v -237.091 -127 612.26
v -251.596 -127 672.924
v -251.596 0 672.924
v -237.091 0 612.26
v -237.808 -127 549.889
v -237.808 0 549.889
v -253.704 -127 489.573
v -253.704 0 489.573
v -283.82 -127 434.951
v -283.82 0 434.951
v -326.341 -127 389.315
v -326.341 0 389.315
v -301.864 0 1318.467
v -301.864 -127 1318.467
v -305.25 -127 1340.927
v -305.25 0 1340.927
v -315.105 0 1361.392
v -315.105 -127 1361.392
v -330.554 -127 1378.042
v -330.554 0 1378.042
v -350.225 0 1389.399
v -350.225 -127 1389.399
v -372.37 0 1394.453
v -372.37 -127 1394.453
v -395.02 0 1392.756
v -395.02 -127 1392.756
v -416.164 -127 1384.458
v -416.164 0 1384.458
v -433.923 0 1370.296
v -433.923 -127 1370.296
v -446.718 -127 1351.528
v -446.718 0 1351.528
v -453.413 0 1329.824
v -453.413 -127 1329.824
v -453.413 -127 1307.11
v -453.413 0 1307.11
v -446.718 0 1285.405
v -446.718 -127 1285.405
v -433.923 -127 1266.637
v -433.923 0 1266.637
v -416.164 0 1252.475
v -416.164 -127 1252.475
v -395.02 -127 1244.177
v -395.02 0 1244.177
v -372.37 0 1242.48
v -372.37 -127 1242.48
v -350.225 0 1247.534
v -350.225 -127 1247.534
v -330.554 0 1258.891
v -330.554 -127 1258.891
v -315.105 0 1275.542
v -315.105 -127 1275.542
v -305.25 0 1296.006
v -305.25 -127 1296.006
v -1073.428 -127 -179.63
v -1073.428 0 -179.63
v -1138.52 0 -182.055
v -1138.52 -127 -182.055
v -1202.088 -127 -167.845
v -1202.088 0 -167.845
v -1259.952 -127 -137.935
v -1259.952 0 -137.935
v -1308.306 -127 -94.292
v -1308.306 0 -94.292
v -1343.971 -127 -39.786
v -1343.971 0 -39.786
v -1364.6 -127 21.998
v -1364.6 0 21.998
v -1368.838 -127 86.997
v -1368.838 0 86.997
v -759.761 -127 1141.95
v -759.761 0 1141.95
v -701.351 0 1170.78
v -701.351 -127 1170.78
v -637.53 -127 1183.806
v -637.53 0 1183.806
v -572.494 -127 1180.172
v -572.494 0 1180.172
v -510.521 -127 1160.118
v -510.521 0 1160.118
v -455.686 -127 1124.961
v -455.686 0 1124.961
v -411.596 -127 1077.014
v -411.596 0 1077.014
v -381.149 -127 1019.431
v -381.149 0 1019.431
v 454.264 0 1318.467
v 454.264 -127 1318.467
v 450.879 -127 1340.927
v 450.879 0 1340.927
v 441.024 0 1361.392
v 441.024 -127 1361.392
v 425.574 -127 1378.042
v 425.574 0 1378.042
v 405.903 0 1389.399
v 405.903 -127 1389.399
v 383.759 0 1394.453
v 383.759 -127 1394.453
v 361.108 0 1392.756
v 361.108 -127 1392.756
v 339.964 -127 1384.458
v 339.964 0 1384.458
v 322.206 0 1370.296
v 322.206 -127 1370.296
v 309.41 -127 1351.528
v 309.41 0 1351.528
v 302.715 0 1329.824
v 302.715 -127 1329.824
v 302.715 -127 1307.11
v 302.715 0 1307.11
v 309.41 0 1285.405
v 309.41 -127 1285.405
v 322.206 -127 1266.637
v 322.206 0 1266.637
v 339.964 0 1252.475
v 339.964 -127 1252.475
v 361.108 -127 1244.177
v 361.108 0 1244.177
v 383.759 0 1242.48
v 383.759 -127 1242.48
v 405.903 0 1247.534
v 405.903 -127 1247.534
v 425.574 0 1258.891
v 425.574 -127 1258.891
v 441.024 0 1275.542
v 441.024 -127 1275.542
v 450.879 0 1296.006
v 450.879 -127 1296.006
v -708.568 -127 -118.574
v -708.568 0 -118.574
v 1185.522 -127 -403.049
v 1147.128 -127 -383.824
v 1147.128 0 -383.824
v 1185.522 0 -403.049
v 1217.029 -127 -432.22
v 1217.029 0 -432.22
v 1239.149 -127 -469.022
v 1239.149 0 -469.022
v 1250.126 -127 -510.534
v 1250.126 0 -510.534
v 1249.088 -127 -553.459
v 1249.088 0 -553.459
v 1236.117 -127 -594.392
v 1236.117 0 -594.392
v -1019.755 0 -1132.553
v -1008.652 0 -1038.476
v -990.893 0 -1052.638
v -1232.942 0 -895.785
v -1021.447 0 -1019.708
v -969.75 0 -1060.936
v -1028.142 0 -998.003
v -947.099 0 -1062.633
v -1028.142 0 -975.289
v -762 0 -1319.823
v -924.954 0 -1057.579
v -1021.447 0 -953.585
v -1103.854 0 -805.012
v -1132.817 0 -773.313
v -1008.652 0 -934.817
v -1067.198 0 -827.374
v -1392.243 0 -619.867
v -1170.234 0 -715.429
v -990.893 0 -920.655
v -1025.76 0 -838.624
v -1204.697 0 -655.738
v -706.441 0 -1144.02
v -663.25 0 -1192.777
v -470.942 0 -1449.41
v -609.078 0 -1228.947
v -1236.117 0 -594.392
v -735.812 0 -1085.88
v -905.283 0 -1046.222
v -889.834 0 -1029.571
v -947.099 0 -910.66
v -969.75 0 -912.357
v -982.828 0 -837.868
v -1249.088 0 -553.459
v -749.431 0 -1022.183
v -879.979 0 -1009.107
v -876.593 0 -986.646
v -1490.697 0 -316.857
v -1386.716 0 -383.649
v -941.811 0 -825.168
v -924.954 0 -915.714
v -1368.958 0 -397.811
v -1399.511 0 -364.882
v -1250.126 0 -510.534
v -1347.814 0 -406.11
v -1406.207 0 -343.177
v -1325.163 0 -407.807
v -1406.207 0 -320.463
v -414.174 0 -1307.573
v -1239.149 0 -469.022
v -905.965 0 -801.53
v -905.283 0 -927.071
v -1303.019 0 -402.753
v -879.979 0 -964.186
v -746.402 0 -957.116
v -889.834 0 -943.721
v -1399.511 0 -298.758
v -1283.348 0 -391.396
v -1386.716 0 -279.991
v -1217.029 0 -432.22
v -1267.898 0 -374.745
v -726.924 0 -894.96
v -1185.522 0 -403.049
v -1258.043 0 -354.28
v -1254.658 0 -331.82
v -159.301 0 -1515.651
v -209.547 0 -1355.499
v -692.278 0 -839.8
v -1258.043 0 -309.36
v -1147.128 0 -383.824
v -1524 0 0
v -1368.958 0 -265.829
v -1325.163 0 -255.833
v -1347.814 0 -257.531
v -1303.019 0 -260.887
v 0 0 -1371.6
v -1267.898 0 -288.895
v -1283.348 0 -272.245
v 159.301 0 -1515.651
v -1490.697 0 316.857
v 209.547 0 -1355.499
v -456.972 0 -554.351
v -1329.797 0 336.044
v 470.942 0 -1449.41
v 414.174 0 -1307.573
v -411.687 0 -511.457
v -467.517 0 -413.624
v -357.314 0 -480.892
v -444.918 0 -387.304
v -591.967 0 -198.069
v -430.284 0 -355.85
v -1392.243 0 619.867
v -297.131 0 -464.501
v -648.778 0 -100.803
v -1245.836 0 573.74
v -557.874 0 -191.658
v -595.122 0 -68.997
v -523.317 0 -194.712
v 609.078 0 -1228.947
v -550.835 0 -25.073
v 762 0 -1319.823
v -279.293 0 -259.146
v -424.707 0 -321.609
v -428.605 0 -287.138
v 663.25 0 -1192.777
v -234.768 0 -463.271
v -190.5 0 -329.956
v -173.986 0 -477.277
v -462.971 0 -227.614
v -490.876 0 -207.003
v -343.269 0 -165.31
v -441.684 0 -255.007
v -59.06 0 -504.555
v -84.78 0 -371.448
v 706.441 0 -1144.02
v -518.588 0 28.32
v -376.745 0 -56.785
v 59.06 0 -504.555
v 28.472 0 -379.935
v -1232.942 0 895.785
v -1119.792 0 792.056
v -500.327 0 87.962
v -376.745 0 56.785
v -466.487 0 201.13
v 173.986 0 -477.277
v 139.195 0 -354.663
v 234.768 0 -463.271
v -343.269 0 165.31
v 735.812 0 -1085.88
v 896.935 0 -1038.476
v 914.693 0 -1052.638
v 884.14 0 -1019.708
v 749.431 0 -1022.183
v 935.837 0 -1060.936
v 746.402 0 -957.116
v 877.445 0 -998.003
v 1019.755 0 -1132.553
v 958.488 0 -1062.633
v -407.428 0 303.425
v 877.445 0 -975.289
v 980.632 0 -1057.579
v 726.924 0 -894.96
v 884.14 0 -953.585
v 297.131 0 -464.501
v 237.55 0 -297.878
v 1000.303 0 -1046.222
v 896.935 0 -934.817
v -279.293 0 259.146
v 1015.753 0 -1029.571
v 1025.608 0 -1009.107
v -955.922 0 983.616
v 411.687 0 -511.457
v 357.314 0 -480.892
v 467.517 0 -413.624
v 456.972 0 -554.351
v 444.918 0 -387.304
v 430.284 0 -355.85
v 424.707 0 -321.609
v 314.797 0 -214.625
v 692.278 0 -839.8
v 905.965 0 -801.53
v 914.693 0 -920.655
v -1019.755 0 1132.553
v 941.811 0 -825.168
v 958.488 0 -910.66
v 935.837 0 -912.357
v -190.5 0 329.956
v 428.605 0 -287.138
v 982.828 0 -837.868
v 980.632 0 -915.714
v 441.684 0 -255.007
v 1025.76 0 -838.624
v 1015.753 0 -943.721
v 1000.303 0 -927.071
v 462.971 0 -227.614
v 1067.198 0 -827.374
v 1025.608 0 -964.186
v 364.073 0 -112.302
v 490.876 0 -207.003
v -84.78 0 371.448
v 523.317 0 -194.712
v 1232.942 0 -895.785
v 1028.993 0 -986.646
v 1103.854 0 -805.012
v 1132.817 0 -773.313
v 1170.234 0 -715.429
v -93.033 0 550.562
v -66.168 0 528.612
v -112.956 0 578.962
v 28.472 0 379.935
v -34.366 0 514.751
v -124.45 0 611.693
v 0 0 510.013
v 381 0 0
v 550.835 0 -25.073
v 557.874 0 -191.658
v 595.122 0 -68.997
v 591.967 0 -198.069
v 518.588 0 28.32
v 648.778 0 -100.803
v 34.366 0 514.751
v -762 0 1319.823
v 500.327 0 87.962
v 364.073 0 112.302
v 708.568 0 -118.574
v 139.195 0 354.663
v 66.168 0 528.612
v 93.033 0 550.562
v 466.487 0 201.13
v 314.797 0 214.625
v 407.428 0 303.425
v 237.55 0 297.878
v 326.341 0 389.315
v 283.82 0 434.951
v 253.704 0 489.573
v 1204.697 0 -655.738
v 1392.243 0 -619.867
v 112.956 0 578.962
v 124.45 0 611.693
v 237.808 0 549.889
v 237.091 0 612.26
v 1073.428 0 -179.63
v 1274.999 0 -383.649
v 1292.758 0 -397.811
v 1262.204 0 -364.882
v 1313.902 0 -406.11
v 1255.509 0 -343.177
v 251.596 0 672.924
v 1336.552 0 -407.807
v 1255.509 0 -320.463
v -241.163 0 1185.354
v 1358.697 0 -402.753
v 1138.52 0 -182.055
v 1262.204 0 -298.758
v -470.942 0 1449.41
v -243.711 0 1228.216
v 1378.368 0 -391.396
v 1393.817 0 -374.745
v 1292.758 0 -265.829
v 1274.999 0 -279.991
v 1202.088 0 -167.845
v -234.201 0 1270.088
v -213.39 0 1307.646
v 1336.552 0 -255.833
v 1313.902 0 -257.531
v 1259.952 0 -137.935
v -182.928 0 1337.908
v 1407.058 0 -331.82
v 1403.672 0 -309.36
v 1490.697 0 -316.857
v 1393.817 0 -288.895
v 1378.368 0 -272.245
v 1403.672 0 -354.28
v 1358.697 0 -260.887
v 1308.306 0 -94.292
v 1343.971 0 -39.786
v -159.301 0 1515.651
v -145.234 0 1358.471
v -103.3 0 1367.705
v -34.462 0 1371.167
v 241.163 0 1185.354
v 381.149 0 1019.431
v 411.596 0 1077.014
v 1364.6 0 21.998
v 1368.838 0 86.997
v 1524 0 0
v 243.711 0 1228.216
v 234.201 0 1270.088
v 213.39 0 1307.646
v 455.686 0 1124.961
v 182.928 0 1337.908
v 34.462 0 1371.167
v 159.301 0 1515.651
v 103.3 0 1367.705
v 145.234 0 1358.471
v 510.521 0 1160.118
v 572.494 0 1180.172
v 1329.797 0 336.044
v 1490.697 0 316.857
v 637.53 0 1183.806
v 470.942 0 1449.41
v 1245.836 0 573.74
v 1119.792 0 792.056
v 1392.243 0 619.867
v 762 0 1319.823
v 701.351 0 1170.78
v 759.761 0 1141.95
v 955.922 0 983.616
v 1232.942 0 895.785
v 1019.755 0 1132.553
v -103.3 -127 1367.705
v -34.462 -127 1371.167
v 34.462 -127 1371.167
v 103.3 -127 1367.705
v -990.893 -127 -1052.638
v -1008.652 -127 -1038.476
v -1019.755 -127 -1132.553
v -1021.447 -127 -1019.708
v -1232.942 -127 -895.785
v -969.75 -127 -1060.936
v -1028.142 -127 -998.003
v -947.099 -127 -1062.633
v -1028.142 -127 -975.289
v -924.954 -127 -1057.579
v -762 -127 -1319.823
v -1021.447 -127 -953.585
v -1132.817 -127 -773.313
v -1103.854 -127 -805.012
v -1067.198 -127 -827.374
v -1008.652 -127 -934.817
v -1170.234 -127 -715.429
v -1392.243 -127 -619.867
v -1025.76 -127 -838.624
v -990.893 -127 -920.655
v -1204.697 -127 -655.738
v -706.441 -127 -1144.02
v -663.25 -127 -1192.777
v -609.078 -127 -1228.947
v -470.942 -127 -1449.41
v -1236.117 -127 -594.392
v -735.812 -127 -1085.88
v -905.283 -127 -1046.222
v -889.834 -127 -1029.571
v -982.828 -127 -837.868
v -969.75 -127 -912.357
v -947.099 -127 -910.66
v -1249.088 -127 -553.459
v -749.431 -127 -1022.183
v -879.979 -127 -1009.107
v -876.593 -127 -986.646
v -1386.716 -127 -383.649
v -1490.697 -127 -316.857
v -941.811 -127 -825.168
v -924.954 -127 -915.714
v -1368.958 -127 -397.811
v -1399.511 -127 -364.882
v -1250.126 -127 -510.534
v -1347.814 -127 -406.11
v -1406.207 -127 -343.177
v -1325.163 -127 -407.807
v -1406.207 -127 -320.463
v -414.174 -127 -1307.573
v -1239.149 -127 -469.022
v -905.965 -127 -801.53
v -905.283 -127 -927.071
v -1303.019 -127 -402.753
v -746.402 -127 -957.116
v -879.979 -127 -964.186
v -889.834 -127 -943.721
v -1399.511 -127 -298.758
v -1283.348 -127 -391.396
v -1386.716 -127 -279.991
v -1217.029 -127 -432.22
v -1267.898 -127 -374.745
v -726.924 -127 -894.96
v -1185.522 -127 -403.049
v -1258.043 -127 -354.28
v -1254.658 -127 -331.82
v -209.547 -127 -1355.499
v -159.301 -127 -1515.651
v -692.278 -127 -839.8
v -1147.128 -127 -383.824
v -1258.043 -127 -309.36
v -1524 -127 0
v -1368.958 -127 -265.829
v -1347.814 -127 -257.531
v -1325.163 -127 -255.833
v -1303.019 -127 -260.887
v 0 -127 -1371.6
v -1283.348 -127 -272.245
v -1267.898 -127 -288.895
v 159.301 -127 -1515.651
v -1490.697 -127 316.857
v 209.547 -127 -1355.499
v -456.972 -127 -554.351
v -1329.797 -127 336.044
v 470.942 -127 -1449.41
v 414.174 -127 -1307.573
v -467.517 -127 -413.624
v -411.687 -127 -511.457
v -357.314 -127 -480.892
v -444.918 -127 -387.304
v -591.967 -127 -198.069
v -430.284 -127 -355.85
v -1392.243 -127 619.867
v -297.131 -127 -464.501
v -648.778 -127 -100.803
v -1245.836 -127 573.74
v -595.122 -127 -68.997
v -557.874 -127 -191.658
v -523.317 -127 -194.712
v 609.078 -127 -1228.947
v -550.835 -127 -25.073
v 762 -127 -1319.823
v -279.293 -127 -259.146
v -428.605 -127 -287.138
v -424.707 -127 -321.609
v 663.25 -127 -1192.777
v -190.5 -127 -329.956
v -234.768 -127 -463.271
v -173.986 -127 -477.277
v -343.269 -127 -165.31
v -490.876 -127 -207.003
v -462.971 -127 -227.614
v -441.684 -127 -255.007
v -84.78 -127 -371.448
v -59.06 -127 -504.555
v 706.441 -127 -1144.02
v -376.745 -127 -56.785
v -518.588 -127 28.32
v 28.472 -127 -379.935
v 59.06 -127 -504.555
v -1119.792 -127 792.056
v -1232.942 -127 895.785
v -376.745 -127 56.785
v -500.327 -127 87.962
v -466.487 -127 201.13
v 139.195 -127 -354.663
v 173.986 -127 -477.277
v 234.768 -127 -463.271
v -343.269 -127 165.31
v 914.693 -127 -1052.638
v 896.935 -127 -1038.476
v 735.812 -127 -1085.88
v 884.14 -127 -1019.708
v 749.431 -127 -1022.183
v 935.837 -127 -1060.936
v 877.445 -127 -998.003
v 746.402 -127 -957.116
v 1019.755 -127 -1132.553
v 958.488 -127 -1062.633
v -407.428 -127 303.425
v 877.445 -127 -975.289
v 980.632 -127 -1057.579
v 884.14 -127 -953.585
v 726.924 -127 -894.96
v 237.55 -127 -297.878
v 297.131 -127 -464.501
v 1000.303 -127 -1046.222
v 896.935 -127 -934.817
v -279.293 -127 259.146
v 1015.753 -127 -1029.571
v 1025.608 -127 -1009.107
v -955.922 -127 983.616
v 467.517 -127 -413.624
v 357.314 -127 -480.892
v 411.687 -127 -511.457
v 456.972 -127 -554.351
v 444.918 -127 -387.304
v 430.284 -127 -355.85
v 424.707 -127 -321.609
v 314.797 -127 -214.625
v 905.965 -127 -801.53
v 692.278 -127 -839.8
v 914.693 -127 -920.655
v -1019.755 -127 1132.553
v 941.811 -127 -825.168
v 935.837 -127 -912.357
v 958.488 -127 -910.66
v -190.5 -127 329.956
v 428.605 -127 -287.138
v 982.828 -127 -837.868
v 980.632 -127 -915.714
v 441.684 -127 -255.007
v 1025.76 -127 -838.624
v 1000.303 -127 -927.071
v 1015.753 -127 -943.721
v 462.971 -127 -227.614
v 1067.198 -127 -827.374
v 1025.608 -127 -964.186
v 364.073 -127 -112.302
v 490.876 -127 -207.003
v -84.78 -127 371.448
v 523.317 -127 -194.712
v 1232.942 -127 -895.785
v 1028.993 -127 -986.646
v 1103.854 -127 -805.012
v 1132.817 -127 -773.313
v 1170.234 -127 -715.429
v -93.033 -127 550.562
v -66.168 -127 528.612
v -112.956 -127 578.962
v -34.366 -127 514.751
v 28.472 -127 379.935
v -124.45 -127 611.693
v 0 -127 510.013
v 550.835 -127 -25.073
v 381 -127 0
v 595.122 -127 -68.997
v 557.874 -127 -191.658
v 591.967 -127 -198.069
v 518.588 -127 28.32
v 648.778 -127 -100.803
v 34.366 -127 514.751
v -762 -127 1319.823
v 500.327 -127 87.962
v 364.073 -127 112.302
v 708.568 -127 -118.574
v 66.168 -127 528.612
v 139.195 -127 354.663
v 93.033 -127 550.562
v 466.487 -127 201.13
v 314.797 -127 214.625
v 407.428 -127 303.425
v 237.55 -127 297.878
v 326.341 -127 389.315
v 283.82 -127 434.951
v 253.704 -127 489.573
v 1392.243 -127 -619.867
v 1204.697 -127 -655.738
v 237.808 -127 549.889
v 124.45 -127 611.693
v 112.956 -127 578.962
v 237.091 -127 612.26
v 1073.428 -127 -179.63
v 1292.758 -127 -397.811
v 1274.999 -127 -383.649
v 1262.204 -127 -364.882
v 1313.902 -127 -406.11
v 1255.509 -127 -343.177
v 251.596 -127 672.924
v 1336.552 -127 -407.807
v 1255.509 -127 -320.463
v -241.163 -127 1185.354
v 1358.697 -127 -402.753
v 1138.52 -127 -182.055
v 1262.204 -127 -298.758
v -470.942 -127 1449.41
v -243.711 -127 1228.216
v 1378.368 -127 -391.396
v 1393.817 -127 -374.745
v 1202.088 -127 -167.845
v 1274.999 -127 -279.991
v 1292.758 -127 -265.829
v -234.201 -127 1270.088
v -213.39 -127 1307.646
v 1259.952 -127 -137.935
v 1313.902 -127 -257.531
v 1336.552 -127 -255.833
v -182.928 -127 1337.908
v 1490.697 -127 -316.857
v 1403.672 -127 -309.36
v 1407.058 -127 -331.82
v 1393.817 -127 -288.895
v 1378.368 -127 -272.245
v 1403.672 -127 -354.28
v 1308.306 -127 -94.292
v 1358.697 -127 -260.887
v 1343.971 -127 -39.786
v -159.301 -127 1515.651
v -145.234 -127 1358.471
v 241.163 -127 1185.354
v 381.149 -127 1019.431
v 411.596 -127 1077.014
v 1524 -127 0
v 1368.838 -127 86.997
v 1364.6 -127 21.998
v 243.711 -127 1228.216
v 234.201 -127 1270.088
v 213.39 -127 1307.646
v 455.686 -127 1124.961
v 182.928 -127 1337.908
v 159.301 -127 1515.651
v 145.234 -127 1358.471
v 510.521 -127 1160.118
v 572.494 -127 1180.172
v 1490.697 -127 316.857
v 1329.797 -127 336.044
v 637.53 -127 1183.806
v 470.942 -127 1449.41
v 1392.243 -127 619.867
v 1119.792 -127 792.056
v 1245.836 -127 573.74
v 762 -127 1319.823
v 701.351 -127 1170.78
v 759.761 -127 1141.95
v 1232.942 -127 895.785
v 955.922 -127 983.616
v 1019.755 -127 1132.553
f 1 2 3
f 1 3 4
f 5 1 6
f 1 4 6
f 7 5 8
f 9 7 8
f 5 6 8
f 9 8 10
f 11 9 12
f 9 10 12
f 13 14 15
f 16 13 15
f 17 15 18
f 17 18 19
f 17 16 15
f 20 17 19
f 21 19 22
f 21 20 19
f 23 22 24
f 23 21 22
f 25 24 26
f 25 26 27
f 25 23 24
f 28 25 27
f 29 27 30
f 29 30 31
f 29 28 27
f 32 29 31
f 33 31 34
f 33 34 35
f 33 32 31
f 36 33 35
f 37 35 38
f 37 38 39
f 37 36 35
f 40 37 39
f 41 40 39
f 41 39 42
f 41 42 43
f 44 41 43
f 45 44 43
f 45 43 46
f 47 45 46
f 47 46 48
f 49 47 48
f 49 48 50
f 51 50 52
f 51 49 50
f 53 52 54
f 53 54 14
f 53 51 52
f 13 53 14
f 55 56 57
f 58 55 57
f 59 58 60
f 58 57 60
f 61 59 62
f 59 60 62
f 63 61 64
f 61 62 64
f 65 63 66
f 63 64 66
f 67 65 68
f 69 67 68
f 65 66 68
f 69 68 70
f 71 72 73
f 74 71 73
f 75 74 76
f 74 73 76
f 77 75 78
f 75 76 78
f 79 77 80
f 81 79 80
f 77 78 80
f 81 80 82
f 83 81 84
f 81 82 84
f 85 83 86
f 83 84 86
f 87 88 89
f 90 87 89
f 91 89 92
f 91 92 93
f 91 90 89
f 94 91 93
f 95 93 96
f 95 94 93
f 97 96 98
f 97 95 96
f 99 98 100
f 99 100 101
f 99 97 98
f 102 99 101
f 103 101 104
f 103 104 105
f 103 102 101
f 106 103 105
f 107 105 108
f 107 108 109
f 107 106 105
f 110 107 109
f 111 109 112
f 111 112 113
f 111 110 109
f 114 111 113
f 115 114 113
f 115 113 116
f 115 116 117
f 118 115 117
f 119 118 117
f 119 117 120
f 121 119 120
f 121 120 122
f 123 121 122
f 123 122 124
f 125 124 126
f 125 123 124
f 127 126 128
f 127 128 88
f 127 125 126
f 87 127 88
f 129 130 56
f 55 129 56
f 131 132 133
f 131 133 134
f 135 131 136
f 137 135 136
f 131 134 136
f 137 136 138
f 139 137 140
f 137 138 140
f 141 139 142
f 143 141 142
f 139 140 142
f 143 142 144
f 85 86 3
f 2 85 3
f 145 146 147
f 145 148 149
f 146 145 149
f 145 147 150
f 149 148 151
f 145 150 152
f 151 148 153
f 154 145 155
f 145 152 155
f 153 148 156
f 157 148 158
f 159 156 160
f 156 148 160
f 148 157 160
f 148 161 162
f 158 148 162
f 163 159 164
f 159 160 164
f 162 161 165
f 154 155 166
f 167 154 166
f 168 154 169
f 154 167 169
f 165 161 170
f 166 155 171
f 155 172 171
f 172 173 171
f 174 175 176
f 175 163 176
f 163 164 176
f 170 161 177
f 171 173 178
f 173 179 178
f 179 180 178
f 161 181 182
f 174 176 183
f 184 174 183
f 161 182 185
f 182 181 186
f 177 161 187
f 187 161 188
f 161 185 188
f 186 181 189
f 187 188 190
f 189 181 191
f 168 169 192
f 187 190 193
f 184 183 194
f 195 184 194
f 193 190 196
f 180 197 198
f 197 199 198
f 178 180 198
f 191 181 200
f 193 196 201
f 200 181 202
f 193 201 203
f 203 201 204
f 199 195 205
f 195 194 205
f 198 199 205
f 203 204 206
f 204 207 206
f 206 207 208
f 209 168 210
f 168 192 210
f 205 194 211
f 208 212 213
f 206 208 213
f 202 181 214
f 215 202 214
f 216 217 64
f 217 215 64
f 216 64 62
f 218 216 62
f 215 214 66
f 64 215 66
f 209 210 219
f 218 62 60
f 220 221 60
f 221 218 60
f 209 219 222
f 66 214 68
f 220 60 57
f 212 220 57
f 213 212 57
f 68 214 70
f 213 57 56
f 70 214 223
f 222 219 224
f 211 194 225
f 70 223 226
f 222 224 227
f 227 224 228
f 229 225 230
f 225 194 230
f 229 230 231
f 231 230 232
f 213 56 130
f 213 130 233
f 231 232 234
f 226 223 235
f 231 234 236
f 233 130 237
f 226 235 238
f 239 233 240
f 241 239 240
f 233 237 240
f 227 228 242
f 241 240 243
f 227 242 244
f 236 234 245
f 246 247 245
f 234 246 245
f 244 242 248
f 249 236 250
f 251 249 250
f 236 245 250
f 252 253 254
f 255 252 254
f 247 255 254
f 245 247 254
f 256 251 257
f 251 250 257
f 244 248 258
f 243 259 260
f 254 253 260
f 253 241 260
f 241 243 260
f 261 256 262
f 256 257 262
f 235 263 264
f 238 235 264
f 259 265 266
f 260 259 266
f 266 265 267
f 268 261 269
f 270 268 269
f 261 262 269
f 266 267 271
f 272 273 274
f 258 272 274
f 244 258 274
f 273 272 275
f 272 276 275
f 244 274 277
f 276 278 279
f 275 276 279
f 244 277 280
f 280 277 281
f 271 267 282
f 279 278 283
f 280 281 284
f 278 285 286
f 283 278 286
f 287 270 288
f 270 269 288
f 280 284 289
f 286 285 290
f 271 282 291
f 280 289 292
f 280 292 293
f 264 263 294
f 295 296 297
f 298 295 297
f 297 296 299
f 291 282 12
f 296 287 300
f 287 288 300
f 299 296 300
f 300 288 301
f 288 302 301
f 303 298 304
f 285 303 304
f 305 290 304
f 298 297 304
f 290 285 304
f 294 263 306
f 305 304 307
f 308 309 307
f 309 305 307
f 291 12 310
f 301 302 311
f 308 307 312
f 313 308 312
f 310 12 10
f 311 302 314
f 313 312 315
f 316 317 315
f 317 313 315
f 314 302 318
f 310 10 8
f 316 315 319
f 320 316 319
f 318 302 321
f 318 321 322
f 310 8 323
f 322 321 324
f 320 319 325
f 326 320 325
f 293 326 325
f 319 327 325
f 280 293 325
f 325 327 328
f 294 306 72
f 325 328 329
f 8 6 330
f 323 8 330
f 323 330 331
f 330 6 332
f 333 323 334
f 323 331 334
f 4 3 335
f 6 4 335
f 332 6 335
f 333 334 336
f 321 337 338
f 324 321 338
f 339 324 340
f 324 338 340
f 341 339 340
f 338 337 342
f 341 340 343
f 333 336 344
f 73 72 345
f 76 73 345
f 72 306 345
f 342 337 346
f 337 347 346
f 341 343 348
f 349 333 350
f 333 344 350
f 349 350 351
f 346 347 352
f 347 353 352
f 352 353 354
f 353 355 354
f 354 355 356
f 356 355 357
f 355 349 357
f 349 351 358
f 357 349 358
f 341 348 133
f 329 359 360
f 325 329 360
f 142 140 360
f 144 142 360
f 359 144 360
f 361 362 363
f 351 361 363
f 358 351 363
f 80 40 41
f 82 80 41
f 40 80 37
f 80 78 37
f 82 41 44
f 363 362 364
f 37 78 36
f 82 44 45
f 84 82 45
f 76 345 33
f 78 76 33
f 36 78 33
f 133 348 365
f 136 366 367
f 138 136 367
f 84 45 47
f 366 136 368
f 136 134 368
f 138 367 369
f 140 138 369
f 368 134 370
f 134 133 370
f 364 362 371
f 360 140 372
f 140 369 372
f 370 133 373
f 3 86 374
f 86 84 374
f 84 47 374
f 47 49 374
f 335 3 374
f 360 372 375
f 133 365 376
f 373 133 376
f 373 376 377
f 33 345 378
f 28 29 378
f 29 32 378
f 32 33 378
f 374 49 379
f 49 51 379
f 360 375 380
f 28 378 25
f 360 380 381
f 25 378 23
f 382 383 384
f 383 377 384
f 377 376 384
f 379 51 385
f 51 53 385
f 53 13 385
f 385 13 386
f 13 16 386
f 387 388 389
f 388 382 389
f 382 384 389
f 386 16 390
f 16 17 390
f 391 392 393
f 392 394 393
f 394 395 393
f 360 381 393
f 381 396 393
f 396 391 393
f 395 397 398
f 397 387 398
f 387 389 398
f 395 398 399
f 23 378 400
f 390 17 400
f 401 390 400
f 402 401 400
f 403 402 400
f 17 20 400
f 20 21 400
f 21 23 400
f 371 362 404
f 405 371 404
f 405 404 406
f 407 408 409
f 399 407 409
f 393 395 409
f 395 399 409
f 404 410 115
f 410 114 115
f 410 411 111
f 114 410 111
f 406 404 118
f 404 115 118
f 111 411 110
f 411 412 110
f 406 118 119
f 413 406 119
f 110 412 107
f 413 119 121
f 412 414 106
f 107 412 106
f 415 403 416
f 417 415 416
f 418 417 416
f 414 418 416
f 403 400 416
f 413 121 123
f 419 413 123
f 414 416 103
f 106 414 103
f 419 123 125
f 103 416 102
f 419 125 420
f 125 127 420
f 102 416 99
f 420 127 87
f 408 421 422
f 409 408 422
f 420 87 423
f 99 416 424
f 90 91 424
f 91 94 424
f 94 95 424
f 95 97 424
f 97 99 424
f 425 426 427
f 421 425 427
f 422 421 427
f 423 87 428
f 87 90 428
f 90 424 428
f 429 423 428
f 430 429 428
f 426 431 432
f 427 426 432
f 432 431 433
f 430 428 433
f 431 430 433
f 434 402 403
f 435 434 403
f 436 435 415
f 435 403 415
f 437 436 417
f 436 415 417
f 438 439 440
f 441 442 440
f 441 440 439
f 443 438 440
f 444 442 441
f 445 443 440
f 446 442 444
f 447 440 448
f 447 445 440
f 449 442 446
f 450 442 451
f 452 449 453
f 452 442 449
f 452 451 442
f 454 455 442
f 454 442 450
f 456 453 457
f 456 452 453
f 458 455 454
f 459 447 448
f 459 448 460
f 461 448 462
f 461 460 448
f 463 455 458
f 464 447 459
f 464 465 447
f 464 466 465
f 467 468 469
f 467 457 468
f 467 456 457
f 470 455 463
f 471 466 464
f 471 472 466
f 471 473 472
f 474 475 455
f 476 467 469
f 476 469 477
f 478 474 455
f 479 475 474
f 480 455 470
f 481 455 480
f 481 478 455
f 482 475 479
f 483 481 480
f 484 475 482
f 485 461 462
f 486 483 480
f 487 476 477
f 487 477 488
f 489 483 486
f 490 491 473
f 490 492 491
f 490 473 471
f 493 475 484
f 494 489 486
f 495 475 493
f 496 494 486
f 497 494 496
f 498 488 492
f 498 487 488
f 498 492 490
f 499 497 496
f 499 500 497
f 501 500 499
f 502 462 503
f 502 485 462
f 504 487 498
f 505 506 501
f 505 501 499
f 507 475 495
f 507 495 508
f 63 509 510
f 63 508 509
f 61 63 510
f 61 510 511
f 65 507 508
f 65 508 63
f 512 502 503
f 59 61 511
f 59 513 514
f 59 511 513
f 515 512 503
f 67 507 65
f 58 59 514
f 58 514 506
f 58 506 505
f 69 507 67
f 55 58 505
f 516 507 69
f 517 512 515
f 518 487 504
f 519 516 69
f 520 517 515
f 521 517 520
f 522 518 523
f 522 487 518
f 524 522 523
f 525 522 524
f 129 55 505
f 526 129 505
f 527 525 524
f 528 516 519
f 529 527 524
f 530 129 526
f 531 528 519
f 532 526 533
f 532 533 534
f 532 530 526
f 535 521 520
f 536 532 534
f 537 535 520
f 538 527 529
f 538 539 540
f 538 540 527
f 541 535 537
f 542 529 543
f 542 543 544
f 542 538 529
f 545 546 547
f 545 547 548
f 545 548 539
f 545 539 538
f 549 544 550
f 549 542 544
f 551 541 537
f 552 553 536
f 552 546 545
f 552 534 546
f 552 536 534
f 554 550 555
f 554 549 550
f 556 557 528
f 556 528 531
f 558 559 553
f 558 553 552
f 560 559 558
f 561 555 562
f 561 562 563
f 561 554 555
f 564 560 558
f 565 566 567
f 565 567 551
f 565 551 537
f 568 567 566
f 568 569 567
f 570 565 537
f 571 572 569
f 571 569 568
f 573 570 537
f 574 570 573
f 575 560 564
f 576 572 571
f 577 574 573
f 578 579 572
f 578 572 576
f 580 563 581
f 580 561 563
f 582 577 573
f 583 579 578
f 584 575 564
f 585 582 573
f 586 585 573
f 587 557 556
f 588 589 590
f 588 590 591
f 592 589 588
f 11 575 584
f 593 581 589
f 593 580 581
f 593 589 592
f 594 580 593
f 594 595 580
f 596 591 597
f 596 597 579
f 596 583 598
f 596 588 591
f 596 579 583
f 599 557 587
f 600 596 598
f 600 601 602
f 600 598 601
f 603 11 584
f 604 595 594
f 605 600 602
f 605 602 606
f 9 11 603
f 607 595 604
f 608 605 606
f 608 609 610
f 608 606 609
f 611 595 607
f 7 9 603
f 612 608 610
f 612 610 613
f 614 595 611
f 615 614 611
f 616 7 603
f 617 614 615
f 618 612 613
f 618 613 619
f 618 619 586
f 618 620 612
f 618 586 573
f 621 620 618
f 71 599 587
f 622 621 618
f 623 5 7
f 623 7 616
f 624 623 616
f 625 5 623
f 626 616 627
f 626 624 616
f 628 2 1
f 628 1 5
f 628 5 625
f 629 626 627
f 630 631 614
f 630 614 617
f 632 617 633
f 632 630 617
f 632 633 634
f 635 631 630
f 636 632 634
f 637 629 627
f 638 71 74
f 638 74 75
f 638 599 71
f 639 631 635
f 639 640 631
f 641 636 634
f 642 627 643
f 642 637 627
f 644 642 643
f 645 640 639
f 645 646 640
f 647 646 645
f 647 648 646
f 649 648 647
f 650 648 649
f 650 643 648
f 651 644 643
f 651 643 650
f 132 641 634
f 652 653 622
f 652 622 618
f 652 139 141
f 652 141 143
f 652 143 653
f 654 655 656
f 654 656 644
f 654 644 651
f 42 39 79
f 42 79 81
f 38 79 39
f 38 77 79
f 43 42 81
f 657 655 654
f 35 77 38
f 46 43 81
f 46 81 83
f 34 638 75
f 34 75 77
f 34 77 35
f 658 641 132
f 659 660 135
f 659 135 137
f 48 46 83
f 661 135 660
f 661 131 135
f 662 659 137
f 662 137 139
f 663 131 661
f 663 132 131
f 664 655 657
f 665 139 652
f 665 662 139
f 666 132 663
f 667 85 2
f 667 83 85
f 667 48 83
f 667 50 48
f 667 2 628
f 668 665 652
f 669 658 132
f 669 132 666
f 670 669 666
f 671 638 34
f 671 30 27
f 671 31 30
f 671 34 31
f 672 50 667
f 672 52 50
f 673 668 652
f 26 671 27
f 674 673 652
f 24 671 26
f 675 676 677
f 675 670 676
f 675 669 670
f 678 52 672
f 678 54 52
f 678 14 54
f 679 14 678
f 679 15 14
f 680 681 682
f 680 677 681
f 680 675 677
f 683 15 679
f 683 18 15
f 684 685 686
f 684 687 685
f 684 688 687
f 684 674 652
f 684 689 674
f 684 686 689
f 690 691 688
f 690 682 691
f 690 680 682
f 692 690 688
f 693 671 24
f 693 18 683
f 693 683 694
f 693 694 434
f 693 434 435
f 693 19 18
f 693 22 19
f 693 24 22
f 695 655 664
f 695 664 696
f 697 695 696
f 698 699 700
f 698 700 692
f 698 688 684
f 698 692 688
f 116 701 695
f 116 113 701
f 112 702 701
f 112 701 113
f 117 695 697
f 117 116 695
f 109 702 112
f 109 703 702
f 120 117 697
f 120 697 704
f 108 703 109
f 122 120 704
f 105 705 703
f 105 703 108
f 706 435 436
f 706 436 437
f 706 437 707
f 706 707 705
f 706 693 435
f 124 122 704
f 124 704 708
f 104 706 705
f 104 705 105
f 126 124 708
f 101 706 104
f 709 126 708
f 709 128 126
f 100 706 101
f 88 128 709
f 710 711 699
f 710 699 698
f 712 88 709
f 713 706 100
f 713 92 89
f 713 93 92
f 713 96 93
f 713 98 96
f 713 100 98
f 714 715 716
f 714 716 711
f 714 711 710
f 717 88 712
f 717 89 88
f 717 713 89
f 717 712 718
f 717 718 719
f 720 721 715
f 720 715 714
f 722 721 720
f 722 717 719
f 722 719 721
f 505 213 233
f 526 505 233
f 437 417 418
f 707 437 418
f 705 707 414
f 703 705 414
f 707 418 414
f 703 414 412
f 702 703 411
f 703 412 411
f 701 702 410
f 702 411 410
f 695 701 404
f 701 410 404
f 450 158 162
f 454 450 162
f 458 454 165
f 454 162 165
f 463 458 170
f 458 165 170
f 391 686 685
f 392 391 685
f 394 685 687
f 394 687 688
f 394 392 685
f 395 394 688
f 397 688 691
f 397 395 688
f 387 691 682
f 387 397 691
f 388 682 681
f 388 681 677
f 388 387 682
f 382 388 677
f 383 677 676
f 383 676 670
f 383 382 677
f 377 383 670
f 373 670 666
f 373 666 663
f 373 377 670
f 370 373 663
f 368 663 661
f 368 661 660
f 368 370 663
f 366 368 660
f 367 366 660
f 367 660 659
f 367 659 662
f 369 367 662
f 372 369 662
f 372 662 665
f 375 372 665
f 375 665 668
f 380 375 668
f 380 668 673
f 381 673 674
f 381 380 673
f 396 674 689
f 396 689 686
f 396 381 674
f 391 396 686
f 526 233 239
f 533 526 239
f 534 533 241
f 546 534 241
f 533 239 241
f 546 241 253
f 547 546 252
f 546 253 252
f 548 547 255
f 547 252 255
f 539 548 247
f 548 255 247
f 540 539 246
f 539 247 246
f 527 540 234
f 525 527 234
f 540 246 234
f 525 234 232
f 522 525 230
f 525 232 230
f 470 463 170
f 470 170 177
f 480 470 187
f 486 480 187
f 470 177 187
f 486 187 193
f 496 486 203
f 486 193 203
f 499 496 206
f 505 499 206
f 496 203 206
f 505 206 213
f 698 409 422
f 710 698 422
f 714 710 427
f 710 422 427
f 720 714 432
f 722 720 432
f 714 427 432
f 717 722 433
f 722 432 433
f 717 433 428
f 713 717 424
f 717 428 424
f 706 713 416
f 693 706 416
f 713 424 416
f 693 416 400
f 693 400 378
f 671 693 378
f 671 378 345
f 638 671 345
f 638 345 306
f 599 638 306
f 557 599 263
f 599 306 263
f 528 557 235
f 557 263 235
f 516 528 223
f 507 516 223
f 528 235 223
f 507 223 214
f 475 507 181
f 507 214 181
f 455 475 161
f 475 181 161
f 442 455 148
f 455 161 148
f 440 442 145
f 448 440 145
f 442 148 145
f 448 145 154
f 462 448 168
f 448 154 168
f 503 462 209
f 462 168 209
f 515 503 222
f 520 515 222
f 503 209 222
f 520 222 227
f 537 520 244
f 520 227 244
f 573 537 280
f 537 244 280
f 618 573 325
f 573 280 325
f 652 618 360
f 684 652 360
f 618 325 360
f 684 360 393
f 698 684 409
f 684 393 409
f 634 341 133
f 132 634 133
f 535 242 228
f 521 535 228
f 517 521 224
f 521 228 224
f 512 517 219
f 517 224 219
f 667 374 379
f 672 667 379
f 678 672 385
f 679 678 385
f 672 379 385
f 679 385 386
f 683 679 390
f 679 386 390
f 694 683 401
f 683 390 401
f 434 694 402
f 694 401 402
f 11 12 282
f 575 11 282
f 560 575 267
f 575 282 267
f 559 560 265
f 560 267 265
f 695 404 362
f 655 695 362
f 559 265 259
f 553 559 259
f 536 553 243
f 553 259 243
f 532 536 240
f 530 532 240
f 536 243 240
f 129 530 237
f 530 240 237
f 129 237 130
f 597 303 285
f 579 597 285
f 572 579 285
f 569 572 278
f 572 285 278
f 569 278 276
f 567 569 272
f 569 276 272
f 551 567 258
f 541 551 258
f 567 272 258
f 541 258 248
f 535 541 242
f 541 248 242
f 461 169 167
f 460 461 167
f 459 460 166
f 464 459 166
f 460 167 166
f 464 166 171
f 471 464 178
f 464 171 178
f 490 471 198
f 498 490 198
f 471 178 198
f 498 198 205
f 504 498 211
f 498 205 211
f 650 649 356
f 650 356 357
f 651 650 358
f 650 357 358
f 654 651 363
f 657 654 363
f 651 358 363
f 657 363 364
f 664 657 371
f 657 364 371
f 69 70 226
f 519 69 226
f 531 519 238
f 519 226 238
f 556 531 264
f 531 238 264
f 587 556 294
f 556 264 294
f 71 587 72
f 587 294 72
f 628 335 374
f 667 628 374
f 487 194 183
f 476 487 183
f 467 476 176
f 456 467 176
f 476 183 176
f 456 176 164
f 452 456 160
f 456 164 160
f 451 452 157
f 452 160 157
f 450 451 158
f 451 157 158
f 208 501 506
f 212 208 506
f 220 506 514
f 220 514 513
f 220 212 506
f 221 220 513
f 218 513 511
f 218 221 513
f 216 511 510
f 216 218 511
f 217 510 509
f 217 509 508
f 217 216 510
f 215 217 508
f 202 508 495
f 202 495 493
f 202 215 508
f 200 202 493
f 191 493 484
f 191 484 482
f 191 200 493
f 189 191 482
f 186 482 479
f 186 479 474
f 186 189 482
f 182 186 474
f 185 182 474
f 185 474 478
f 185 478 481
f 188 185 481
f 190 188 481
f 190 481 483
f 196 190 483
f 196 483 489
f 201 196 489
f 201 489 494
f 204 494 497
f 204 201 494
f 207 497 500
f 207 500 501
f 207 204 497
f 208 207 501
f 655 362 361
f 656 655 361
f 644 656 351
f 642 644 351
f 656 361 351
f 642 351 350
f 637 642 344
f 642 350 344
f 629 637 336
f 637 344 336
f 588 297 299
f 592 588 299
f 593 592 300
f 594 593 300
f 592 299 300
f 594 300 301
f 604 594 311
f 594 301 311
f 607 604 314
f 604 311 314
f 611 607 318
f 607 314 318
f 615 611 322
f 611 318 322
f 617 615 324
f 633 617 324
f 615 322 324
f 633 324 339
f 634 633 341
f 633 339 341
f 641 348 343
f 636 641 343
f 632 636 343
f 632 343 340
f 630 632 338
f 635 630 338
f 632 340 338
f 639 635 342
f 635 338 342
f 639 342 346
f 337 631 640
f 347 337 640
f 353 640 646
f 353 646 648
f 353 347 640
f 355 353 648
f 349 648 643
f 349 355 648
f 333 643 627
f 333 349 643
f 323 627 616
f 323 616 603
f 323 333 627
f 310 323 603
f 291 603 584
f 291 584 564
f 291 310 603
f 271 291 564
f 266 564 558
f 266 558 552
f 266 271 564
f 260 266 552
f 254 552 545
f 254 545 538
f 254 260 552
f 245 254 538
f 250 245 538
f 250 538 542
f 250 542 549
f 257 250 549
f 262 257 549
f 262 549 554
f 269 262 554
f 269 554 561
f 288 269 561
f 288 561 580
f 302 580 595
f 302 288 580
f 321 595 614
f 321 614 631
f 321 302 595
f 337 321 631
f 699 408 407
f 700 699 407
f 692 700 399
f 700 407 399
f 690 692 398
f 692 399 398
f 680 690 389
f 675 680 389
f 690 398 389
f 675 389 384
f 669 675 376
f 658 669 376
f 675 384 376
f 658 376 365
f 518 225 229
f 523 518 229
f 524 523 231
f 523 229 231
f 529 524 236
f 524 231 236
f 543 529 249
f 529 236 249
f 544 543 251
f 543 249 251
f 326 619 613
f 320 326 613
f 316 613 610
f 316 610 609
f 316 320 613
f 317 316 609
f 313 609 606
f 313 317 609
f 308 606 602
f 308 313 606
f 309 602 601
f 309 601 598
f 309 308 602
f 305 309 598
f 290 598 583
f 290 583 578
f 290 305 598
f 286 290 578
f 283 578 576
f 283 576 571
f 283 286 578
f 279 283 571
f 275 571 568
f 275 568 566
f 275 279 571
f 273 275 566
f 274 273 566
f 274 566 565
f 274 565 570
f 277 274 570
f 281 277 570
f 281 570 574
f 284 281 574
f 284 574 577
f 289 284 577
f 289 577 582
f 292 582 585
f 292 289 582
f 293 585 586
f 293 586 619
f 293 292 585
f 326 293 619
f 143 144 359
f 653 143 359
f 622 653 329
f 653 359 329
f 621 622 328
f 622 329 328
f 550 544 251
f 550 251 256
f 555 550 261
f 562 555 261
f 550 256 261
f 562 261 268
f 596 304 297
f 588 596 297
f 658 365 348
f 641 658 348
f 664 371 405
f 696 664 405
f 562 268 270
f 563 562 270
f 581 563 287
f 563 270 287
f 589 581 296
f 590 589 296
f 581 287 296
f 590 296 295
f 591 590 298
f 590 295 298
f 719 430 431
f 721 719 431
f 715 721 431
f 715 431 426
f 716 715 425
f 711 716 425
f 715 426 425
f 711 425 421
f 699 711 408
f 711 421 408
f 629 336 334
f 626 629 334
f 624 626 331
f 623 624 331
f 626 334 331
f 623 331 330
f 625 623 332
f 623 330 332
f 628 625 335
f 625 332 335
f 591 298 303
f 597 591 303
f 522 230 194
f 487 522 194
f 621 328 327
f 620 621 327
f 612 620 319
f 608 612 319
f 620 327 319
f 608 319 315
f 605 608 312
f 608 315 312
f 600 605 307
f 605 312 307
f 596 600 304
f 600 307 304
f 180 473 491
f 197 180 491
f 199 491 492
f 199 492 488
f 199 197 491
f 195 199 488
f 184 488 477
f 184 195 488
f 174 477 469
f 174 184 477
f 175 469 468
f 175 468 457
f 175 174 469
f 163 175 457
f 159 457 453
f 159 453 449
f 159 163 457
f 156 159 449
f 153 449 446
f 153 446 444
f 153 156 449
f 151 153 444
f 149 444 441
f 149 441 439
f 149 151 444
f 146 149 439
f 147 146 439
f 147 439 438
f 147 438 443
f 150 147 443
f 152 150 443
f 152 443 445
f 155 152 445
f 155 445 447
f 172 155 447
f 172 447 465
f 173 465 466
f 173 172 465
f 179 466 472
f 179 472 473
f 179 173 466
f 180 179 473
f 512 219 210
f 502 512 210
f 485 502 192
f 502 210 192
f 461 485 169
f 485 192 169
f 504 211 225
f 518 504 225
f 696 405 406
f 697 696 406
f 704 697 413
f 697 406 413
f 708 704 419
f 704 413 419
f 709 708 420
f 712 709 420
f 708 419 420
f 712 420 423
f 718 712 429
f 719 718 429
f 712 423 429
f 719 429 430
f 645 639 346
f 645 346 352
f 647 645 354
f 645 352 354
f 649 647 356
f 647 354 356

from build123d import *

# Parameters (mm, degrees)
F0_R     = 1524
F0_R_2   = 76.2
F0_R_3   = 381
F1_DEPTH = 127


with BuildPart() as f1:
    # F0 (on Front) → F1 (new body)
    with BuildSketch(Plane.XZ):
        Circle(F0_R)
        with Locations((-952.793421, -986.64647)):
            Circle(F0_R_2, mode=Mode.SUBTRACT)
        with BuildLine():
            Line((-1147.127855, -383.823611), (-591.96728, -198.069481))
            ThreePointArc((-591.96728, -198.069481), (-441.684362, -255.006585), (-467.516842, -413.623962))
            Line((-467.516842, -413.623962), (-905.964925, -801.530058))
            ThreePointArc((-905.964925, -801.530058), (-1025.759688, -838.623755), (-1132.816748, -773.312857))
            ThreePointArc((-1132.816748, -773.312857), (-1187.840444, -685.8), (-1236.116953, -594.391653))
            ThreePointArc((-1236.116953, -594.391653), (-1239.14932, -469.02207), (-1147.127855, -383.823611))
        make_face(mode=Mode.SUBTRACT)
        with Locations((-1330.857618, -331.820072)):
            Circle(F0_R_2, mode=Mode.SUBTRACT)
        with BuildLine():
            Line((-692.27808, -839.800465), (-456.971626, -554.350911))
            ThreePointArc((-456.971626, -554.350911), (-327.727364, -470.842027), (-173.985988, -477.276519))
            ThreePointArc((-173.985988, -477.276519), (0, -508), (173.985988, -477.276519))
            ThreePointArc((173.985988, -477.276519), (327.727364, -470.842027), (456.971626, -554.350911))
            Line((456.971626, -554.350911), (692.27808, -839.800465))
            ThreePointArc((692.27808, -839.800465), (744.671817, -1054.469942), (609.07758, -1228.947135))
            ThreePointArc((609.07758, -1228.947135), (312.78001, -1335.460679), (0, -1371.6))
            ThreePointArc((0, -1371.6), (-312.78001, -1335.460679), (-609.07758, -1228.947135))
            ThreePointArc((-609.07758, -1228.947135), (-744.671817, -1054.469942), (-692.27808, -839.800465))
        make_face(mode=Mode.SUBTRACT)
        with Locations((952.793421, -986.64647)):
            Circle(F0_R_2, mode=Mode.SUBTRACT)
        with BuildLine():
            Line((905.964925, -801.530058), (467.516842, -413.623962))
            ThreePointArc((467.516842, -413.623962), (441.684362, -255.006585), (591.96728, -198.069481))
            Line((591.96728, -198.069481), (1147.127855, -383.823611))
            ThreePointArc((1147.127855, -383.823611), (1239.14932, -469.02207), (1236.116953, -594.391653))
            ThreePointArc((1236.116953, -594.391653), (1187.840444, -685.8), (1132.816748, -773.312857))
            ThreePointArc((1132.816748, -773.312857), (1025.759688, -838.623755), (905.964925, -801.530058))
        make_face(mode=Mode.SUBTRACT)
        with Locations((1330.857618, -331.820072)):
            Circle(F0_R_2, mode=Mode.SUBTRACT)
        with BuildLine():
            ThreePointArc((-251.596158, 672.924493), (-243.897475, 519.241236), (-326.340596, 389.314545))
            ThreePointArc((-326.340596, 389.314545), (-439.940905, 254), (-500.326584, 87.961974))
            ThreePointArc((-500.326584, 87.961974), (-571.624839, -48.399209), (-708.567785, -118.573582))
            Line((-708.567785, -118.573582), (-1073.427576, -179.630171))
            ThreePointArc((-1073.427576, -179.630171), (-1285.533665, -117.66974), (-1368.838229, 86.99691))
            ThreePointArc((-1368.838229, 86.99691), (-1187.840444, 685.8), (-759.760649, 1141.950225))
            ThreePointArc((-759.760649, 1141.950225), (-540.861849, 1172.139682), (-381.149497, 1019.430636))
            Line((-381.149497, 1019.430636), (-251.596158, 672.924493))
        make_face(mode=Mode.SUBTRACT)
        with Locations((-378.064197, 1318.466542)):
            Circle(F0_R_2, mode=Mode.SUBTRACT)
        Circle(F0_R_3, mode=Mode.SUBTRACT)
        with BuildLine():
            ThreePointArc((708.567785, -118.573582), (571.624839, -48.399209), (500.326584, 87.961974))
            ThreePointArc((500.326584, 87.961974), (439.940905, 254), (326.340596, 389.314545))
            ThreePointArc((326.340596, 389.314545), (243.897475, 519.241236), (251.596158, 672.924493))
            Line((251.596158, 672.924493), (381.149497, 1019.430636))
            ThreePointArc((381.149497, 1019.430636), (540.861849, 1172.139682), (759.760649, 1141.950225))
            ThreePointArc((759.760649, 1141.950225), (1187.840444, 685.8), (1368.838229, 86.99691))
            ThreePointArc((1368.838229, 86.99691), (1285.533665, -117.66974), (1073.427576, -179.630171))
            Line((1073.427576, -179.630171), (708.567785, -118.573582))
        make_face(mode=Mode.SUBTRACT)
        with BuildLine():
            ThreePointArc((0, 510.013171), (-80.353577, 538.665305), (-124.450437, 611.693443))
            Line((-124.450437, 611.693443), (-241.16293, 1185.353669))
            ThreePointArc((-241.16293, 1185.353669), (-213.389632, 1307.645825), (-103.300205, 1367.70451))
            ThreePointArc((-103.300205, 1367.70451), (0, 1371.6), (103.300205, 1367.70451))
            ThreePointArc((103.300205, 1367.70451), (213.389632, 1307.645825), (241.16293, 1185.353669))
            Line((241.16293, 1185.353669), (124.450437, 611.693443))
            ThreePointArc((124.450437, 611.693443), (80.353577, 538.665305), (0, 510.013171))
        make_face(mode=Mode.SUBTRACT)
        with Locations((378.064197, 1318.466542)):
            Circle(F0_R_2, mode=Mode.SUBTRACT)
    extrude(amount=F1_DEPTH)


solid = f1.part
